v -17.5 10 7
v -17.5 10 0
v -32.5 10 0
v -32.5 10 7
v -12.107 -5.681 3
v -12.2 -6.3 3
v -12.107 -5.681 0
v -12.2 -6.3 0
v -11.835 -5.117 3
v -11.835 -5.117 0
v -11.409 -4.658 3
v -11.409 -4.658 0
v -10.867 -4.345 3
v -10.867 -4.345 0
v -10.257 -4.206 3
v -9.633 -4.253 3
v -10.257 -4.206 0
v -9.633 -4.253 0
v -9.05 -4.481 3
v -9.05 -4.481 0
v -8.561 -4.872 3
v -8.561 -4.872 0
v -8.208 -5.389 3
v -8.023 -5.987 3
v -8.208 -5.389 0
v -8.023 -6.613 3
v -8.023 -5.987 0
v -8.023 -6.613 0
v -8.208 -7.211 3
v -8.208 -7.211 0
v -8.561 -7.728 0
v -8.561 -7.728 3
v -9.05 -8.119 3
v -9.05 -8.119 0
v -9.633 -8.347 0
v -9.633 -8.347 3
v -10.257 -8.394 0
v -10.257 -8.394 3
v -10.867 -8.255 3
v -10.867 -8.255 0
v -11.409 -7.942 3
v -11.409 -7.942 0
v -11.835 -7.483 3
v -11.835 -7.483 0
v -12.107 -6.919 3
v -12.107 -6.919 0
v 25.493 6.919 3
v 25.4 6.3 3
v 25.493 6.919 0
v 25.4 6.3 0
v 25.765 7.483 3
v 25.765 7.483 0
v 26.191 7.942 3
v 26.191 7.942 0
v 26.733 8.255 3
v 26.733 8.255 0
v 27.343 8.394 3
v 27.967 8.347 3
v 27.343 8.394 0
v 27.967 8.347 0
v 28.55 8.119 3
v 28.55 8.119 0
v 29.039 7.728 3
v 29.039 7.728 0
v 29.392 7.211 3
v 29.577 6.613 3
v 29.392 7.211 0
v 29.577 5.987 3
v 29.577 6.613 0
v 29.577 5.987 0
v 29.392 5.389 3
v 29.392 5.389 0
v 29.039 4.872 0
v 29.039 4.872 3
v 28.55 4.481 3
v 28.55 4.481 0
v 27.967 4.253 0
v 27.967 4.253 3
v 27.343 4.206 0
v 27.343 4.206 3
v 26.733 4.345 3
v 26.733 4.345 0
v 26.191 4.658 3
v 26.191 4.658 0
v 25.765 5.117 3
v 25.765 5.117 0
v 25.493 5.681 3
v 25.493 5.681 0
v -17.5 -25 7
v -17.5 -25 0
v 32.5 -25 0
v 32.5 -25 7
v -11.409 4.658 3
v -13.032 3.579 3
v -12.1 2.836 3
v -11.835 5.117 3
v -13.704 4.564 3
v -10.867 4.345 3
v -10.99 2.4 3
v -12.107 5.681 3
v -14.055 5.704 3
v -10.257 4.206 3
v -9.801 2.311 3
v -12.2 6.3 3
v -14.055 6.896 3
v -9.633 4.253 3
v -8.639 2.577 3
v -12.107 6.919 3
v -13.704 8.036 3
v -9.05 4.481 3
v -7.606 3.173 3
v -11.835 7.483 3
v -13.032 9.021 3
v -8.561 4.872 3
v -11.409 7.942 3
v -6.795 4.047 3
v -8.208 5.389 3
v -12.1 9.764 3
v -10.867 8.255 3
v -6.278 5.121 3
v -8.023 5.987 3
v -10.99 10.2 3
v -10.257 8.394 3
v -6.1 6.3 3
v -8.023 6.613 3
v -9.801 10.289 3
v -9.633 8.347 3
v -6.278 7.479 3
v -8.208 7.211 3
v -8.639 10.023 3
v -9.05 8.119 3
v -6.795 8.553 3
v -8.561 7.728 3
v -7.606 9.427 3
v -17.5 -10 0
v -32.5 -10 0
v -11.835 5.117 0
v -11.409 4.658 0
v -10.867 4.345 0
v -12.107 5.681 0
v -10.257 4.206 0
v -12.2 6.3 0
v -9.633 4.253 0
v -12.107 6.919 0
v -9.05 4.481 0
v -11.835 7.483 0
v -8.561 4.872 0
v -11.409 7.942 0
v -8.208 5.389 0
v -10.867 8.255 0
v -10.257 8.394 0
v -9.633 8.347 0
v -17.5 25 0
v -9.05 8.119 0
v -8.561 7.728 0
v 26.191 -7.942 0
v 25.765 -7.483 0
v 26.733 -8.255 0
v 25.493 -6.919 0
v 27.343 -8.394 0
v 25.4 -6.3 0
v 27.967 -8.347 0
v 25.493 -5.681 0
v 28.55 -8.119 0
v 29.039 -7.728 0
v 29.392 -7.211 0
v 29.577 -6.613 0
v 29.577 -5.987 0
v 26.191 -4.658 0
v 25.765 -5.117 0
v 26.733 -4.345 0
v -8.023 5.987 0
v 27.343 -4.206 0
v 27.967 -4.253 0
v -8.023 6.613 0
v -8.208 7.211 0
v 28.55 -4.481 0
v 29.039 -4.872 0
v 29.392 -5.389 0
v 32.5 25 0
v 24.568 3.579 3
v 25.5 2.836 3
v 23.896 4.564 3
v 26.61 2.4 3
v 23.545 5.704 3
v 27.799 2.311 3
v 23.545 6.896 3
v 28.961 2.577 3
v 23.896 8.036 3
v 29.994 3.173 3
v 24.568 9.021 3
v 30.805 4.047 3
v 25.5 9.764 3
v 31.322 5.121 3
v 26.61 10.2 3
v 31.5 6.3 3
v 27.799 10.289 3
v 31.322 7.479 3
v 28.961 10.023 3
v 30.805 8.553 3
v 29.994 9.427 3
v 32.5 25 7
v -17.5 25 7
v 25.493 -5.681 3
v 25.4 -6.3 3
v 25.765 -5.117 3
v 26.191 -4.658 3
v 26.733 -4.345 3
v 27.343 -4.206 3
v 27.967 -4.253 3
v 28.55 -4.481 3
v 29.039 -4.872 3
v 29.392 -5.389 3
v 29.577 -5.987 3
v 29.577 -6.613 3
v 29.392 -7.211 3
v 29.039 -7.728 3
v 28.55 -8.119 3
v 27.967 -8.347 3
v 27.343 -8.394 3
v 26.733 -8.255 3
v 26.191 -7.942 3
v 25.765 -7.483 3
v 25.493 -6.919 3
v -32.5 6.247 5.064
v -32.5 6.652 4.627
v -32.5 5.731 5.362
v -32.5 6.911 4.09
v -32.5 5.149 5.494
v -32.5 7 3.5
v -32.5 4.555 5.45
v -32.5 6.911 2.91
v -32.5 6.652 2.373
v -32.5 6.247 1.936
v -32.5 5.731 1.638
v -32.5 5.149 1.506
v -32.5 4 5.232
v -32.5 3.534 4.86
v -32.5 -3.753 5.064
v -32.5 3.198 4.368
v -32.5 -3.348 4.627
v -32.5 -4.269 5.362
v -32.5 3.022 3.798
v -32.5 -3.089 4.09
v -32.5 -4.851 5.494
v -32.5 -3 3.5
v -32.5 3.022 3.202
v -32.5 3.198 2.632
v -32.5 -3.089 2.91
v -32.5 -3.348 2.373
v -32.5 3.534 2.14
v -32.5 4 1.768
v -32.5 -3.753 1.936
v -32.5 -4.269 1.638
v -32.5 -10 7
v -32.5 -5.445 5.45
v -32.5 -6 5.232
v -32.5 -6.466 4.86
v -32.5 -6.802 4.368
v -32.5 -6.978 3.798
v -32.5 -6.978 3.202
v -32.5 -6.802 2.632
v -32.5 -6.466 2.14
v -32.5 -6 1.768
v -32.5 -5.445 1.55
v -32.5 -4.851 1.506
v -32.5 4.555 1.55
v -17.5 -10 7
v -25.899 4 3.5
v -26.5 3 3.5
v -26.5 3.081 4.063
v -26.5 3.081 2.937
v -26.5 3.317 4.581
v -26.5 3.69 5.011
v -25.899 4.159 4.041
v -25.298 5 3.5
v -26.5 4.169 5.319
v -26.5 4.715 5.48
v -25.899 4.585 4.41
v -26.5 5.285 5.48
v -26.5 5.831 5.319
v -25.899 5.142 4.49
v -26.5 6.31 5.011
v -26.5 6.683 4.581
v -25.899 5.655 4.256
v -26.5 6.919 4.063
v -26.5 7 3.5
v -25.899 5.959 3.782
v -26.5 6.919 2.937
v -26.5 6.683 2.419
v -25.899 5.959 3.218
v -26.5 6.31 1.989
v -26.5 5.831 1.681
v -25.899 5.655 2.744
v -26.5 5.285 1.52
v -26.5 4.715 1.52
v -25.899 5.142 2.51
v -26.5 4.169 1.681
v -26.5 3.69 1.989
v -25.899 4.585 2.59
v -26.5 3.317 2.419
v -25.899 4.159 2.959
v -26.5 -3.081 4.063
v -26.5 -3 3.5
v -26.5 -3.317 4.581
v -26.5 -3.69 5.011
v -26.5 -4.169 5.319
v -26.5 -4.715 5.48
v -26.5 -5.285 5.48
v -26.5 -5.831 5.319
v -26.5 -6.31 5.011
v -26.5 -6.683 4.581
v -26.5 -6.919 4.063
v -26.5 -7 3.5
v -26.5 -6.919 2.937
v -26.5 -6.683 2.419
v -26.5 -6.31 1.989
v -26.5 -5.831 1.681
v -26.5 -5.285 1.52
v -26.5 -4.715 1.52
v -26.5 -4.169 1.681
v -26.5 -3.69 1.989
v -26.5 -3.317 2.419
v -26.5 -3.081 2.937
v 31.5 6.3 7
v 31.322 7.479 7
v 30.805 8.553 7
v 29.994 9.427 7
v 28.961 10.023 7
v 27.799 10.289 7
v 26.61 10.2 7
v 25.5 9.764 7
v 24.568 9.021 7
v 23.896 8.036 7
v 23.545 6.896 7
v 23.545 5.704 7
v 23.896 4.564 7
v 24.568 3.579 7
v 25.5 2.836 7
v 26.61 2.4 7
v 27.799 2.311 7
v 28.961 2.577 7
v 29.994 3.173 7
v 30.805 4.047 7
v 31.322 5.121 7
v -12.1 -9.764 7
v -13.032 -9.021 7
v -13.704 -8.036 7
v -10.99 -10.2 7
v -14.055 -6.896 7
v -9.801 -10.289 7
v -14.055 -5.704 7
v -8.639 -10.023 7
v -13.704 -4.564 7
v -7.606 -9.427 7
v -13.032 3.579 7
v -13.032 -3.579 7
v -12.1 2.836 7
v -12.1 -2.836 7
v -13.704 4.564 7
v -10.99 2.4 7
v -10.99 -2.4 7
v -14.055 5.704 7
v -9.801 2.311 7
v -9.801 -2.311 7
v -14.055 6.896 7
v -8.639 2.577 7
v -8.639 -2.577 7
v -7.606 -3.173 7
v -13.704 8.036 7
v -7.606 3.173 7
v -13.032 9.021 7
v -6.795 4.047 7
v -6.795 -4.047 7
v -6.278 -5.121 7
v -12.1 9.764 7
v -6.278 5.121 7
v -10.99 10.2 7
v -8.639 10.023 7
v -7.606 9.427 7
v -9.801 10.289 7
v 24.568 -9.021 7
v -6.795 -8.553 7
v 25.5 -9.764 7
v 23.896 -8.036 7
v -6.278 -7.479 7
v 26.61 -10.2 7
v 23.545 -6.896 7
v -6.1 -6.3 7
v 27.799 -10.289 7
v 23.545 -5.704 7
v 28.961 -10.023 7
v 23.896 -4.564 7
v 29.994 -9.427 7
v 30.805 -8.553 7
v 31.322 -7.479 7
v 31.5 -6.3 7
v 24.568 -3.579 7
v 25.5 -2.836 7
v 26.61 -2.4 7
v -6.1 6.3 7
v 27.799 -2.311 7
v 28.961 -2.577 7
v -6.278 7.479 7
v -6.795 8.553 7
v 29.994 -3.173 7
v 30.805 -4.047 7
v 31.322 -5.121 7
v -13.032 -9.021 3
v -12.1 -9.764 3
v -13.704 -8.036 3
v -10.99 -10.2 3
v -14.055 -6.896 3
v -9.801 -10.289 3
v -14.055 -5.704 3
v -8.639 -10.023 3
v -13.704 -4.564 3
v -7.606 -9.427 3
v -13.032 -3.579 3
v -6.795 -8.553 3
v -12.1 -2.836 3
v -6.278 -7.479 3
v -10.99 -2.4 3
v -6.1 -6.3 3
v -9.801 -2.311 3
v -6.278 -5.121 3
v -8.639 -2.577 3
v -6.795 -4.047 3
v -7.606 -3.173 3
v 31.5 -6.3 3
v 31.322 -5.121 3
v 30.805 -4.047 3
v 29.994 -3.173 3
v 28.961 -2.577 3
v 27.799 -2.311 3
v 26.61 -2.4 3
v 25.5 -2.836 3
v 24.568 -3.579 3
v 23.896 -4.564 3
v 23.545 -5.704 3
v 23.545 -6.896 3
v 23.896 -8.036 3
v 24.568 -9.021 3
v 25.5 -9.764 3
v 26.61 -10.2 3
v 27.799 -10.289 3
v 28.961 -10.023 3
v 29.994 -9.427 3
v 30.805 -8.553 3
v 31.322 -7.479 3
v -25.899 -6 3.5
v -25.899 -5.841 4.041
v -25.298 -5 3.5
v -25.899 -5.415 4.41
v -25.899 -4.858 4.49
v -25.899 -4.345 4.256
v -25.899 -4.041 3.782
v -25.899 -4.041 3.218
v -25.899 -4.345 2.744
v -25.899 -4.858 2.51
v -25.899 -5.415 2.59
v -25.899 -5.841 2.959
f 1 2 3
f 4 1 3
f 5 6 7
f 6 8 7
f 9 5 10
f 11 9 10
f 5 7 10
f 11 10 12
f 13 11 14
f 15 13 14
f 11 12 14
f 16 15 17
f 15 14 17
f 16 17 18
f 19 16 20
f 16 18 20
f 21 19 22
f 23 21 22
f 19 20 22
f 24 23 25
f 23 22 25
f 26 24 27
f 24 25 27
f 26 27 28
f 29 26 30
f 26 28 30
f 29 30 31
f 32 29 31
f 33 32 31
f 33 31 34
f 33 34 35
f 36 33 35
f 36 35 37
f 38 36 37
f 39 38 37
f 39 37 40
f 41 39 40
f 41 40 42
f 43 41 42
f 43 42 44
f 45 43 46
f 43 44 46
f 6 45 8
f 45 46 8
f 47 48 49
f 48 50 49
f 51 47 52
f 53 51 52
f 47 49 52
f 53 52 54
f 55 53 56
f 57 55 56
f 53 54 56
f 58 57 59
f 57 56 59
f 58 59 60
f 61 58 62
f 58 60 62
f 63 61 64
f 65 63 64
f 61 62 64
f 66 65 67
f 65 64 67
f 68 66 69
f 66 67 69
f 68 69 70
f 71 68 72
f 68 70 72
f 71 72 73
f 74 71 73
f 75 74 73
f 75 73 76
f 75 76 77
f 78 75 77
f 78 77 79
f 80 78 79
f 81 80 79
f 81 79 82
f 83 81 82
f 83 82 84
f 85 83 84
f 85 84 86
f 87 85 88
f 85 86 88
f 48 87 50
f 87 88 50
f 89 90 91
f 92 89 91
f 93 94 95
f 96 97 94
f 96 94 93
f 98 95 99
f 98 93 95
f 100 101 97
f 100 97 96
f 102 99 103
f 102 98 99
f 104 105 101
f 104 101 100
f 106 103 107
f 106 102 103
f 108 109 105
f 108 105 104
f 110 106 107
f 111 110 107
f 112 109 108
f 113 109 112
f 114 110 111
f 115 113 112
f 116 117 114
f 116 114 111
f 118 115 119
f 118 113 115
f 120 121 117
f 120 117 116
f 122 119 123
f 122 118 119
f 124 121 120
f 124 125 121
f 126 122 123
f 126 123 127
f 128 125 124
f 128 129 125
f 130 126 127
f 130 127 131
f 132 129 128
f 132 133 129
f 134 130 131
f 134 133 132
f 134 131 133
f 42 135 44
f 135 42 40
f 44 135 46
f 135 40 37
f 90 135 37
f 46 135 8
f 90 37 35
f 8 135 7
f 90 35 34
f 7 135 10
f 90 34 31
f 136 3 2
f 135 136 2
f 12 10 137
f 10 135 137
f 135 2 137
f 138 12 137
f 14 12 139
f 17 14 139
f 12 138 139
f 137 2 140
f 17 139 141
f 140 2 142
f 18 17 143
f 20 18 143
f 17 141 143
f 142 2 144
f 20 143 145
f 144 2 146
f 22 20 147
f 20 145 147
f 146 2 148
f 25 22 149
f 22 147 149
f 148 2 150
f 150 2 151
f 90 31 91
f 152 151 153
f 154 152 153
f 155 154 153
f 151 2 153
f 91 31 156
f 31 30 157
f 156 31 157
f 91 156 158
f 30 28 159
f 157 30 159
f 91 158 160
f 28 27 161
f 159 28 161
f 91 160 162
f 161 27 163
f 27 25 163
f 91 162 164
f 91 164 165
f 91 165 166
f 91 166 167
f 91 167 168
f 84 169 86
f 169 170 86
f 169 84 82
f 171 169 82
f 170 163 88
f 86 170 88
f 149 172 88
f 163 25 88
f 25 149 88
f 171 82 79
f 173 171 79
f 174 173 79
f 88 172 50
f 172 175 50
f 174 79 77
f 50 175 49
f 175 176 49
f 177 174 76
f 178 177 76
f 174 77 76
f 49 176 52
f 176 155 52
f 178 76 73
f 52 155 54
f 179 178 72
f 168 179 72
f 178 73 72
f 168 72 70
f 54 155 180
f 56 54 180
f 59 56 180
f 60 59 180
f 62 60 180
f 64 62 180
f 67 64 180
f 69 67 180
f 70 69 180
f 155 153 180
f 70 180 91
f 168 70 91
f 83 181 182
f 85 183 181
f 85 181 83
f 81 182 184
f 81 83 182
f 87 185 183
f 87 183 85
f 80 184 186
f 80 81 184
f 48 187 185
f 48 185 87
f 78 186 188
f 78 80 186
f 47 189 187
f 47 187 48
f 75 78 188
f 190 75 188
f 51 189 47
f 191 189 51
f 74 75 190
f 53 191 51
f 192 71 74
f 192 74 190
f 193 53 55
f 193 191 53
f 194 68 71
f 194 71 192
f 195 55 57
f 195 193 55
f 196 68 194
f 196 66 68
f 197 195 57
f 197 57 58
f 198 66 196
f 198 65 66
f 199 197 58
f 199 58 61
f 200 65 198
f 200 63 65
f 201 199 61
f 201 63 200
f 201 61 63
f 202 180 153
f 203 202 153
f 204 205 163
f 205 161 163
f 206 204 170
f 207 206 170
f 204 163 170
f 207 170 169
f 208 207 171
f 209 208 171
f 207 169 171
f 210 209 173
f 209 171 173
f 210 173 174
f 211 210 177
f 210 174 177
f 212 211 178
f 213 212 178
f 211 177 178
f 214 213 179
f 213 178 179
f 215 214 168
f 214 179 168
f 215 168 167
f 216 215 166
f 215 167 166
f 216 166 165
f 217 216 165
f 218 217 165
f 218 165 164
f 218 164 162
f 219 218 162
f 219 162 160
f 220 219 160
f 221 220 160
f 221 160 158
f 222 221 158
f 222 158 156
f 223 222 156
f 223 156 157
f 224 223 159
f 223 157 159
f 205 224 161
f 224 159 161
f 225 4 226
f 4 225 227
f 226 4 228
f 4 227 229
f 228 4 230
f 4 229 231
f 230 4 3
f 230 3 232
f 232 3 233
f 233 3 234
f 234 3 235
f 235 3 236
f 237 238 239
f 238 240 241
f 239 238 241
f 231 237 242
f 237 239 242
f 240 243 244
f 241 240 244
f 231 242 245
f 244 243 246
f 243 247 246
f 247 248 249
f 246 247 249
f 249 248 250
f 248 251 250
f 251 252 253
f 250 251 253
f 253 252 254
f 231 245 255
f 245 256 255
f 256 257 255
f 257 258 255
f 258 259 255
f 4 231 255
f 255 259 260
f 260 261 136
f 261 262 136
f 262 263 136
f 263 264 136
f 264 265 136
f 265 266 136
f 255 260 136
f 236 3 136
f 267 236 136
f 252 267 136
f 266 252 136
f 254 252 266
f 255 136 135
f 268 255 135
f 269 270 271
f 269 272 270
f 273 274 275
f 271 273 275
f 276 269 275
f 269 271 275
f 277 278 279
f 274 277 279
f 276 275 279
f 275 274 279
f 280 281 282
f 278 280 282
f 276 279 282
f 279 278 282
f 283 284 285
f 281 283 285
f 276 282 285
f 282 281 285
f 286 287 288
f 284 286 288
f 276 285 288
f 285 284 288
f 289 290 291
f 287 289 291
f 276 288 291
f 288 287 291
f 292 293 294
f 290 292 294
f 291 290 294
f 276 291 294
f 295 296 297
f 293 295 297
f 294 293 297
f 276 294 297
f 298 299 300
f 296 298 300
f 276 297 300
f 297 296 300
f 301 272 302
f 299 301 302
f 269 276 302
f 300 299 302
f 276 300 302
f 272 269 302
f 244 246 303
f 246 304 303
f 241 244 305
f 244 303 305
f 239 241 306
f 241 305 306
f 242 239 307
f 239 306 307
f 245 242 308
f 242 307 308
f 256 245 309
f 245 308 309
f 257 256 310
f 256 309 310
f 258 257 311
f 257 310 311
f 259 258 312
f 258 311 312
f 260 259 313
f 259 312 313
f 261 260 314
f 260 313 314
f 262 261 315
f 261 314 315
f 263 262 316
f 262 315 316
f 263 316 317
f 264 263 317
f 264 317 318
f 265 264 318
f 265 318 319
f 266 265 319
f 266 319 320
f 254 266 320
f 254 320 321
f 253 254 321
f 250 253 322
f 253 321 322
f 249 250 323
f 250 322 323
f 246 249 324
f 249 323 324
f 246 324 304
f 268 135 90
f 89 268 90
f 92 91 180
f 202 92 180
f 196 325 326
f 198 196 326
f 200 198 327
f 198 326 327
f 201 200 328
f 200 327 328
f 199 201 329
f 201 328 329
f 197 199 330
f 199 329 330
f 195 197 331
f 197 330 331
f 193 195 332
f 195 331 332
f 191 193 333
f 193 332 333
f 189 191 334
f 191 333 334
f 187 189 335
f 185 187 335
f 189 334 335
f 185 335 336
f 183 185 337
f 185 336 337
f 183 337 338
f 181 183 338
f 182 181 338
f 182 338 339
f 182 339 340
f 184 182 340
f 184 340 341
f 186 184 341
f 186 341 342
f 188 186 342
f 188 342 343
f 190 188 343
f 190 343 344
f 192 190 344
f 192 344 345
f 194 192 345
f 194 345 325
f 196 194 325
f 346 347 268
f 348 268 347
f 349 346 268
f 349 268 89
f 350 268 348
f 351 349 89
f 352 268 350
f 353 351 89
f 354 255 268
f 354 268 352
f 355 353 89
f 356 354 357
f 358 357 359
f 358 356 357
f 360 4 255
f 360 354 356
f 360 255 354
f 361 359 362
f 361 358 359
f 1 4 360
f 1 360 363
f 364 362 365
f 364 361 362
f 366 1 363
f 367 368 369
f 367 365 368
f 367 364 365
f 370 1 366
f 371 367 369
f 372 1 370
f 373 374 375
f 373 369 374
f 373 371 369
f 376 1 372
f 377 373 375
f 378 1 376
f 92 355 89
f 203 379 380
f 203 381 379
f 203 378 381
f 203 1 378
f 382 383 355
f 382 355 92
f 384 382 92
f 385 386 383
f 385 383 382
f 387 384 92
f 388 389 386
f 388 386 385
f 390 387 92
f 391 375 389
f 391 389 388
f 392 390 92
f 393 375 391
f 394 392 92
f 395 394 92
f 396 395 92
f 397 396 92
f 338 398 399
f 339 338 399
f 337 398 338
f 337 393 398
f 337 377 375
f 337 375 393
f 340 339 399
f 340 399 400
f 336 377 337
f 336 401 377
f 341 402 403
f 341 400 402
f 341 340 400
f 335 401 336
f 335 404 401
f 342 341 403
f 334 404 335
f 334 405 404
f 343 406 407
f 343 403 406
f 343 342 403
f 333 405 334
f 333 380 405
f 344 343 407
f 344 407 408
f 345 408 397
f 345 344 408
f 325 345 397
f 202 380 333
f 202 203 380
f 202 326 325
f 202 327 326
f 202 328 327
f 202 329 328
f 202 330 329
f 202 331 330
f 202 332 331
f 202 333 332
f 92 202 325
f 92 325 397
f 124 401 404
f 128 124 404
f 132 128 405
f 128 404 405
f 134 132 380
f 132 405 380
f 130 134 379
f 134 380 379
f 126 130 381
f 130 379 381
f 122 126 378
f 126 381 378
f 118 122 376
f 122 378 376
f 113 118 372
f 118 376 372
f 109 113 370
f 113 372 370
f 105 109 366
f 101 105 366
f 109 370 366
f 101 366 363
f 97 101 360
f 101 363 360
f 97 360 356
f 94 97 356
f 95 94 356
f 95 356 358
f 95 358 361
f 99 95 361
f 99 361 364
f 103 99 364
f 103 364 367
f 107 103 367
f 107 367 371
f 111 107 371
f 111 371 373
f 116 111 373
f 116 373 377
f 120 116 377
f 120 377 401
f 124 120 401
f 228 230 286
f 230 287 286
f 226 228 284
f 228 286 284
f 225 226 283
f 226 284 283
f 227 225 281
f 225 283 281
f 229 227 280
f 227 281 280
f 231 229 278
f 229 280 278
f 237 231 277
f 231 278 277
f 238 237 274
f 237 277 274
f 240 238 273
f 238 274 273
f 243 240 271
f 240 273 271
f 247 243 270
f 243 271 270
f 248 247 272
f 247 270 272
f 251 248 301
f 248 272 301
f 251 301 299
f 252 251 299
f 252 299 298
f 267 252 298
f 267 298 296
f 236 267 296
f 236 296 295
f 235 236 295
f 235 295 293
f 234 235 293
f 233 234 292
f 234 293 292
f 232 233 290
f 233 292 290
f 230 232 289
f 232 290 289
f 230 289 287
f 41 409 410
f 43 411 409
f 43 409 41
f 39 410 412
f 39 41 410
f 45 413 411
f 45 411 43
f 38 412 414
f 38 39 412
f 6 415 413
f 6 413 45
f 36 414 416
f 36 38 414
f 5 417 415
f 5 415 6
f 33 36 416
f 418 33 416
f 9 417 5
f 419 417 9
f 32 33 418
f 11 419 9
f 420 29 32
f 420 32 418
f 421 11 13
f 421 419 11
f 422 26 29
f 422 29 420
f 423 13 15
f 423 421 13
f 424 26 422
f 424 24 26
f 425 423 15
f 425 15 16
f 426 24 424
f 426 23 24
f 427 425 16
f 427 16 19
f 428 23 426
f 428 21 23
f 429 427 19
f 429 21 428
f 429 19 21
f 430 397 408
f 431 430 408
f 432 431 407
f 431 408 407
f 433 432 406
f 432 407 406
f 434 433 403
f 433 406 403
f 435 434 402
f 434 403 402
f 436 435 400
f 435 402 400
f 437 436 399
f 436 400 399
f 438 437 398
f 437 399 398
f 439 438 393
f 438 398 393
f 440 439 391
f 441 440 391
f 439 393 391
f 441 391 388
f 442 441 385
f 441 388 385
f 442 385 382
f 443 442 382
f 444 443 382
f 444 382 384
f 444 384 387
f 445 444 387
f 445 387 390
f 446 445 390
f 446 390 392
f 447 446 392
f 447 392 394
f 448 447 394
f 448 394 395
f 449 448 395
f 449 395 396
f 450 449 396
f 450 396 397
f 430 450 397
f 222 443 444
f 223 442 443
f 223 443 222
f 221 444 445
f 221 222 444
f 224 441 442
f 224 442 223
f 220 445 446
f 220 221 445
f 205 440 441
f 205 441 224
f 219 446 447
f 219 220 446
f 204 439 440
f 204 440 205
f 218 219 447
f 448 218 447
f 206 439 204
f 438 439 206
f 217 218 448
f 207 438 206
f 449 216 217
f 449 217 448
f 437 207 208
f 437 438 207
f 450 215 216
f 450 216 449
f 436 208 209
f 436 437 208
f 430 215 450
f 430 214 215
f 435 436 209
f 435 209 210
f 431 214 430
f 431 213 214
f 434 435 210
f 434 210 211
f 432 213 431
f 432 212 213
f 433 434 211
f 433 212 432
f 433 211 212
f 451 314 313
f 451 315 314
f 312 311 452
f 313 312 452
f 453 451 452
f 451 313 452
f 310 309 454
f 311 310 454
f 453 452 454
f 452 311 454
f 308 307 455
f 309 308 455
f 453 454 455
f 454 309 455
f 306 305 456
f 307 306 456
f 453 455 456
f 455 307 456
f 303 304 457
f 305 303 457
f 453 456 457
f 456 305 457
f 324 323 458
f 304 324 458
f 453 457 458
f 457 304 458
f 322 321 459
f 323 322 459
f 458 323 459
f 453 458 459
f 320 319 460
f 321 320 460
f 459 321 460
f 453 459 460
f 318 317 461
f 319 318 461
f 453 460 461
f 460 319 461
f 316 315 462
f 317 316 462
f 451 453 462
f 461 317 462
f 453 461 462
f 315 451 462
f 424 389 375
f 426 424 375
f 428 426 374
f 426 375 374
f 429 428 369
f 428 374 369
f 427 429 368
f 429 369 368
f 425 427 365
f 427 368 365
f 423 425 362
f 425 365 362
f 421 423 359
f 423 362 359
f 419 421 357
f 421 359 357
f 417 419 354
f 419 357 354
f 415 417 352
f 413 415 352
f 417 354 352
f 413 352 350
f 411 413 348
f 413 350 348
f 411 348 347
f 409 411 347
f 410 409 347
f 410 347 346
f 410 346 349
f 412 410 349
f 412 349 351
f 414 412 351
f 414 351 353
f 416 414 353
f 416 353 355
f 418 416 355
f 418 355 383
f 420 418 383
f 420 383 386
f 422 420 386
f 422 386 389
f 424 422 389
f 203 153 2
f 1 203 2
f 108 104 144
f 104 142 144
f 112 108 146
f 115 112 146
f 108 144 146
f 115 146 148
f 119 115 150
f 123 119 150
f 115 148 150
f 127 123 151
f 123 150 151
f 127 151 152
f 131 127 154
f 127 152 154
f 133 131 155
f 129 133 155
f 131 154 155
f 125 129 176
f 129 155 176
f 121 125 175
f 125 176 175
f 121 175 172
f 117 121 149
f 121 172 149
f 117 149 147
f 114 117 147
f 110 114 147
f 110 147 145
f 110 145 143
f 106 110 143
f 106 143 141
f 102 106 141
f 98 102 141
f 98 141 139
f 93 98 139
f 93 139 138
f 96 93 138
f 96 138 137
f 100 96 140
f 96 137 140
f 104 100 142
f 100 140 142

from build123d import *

# Parameters (mm, degrees)
F1_DEPTH       = 7
F3_D           = 4
F3_DEPTH       = 6
F3_TIP         = 1.2017212381
F5_D           = 4.2
F5_CBORE_D     = 8
F5_CBORE_DEPTH = 4


with BuildPart() as f1:
    # F0 (on Top) → F1 (new body)
    with BuildSketch(Plane.XY):
        Polygon((32.5, -25), (32.5, 25), (-17.5, 25), (-17.5, 10), (-32.5, 10), (-32.5, -10), (-17.5, -10), (-17.5, -25), align=None)
    extrude(amount=F1_DEPTH)

    # F3
    with Locations(Plane(origin=(-32.5, 0, 0), x_dir=(0, -1, 0), z_dir=(-1, 0, 0))):
        with Locations((-5, 3.5), (5, 3.5)):
            Hole(F3_D / 2, depth=F3_DEPTH)
            with Locations((0, 0, -(F3_DEPTH + F3_TIP / 2))):  # 118° drill point
                Cone(0, F3_D / 2, F3_TIP, mode=Mode.SUBTRACT)

    # F5 (through all)
    with Locations(Plane.XY.offset(7)):
        with Locations((-10.1, 6.3), (-10.1, -6.3), (27.5, -6.3), (27.5, 6.3)):
            CounterBoreHole(F5_D / 2, F5_CBORE_D / 2, F5_CBORE_DEPTH)


solid = f1.part
